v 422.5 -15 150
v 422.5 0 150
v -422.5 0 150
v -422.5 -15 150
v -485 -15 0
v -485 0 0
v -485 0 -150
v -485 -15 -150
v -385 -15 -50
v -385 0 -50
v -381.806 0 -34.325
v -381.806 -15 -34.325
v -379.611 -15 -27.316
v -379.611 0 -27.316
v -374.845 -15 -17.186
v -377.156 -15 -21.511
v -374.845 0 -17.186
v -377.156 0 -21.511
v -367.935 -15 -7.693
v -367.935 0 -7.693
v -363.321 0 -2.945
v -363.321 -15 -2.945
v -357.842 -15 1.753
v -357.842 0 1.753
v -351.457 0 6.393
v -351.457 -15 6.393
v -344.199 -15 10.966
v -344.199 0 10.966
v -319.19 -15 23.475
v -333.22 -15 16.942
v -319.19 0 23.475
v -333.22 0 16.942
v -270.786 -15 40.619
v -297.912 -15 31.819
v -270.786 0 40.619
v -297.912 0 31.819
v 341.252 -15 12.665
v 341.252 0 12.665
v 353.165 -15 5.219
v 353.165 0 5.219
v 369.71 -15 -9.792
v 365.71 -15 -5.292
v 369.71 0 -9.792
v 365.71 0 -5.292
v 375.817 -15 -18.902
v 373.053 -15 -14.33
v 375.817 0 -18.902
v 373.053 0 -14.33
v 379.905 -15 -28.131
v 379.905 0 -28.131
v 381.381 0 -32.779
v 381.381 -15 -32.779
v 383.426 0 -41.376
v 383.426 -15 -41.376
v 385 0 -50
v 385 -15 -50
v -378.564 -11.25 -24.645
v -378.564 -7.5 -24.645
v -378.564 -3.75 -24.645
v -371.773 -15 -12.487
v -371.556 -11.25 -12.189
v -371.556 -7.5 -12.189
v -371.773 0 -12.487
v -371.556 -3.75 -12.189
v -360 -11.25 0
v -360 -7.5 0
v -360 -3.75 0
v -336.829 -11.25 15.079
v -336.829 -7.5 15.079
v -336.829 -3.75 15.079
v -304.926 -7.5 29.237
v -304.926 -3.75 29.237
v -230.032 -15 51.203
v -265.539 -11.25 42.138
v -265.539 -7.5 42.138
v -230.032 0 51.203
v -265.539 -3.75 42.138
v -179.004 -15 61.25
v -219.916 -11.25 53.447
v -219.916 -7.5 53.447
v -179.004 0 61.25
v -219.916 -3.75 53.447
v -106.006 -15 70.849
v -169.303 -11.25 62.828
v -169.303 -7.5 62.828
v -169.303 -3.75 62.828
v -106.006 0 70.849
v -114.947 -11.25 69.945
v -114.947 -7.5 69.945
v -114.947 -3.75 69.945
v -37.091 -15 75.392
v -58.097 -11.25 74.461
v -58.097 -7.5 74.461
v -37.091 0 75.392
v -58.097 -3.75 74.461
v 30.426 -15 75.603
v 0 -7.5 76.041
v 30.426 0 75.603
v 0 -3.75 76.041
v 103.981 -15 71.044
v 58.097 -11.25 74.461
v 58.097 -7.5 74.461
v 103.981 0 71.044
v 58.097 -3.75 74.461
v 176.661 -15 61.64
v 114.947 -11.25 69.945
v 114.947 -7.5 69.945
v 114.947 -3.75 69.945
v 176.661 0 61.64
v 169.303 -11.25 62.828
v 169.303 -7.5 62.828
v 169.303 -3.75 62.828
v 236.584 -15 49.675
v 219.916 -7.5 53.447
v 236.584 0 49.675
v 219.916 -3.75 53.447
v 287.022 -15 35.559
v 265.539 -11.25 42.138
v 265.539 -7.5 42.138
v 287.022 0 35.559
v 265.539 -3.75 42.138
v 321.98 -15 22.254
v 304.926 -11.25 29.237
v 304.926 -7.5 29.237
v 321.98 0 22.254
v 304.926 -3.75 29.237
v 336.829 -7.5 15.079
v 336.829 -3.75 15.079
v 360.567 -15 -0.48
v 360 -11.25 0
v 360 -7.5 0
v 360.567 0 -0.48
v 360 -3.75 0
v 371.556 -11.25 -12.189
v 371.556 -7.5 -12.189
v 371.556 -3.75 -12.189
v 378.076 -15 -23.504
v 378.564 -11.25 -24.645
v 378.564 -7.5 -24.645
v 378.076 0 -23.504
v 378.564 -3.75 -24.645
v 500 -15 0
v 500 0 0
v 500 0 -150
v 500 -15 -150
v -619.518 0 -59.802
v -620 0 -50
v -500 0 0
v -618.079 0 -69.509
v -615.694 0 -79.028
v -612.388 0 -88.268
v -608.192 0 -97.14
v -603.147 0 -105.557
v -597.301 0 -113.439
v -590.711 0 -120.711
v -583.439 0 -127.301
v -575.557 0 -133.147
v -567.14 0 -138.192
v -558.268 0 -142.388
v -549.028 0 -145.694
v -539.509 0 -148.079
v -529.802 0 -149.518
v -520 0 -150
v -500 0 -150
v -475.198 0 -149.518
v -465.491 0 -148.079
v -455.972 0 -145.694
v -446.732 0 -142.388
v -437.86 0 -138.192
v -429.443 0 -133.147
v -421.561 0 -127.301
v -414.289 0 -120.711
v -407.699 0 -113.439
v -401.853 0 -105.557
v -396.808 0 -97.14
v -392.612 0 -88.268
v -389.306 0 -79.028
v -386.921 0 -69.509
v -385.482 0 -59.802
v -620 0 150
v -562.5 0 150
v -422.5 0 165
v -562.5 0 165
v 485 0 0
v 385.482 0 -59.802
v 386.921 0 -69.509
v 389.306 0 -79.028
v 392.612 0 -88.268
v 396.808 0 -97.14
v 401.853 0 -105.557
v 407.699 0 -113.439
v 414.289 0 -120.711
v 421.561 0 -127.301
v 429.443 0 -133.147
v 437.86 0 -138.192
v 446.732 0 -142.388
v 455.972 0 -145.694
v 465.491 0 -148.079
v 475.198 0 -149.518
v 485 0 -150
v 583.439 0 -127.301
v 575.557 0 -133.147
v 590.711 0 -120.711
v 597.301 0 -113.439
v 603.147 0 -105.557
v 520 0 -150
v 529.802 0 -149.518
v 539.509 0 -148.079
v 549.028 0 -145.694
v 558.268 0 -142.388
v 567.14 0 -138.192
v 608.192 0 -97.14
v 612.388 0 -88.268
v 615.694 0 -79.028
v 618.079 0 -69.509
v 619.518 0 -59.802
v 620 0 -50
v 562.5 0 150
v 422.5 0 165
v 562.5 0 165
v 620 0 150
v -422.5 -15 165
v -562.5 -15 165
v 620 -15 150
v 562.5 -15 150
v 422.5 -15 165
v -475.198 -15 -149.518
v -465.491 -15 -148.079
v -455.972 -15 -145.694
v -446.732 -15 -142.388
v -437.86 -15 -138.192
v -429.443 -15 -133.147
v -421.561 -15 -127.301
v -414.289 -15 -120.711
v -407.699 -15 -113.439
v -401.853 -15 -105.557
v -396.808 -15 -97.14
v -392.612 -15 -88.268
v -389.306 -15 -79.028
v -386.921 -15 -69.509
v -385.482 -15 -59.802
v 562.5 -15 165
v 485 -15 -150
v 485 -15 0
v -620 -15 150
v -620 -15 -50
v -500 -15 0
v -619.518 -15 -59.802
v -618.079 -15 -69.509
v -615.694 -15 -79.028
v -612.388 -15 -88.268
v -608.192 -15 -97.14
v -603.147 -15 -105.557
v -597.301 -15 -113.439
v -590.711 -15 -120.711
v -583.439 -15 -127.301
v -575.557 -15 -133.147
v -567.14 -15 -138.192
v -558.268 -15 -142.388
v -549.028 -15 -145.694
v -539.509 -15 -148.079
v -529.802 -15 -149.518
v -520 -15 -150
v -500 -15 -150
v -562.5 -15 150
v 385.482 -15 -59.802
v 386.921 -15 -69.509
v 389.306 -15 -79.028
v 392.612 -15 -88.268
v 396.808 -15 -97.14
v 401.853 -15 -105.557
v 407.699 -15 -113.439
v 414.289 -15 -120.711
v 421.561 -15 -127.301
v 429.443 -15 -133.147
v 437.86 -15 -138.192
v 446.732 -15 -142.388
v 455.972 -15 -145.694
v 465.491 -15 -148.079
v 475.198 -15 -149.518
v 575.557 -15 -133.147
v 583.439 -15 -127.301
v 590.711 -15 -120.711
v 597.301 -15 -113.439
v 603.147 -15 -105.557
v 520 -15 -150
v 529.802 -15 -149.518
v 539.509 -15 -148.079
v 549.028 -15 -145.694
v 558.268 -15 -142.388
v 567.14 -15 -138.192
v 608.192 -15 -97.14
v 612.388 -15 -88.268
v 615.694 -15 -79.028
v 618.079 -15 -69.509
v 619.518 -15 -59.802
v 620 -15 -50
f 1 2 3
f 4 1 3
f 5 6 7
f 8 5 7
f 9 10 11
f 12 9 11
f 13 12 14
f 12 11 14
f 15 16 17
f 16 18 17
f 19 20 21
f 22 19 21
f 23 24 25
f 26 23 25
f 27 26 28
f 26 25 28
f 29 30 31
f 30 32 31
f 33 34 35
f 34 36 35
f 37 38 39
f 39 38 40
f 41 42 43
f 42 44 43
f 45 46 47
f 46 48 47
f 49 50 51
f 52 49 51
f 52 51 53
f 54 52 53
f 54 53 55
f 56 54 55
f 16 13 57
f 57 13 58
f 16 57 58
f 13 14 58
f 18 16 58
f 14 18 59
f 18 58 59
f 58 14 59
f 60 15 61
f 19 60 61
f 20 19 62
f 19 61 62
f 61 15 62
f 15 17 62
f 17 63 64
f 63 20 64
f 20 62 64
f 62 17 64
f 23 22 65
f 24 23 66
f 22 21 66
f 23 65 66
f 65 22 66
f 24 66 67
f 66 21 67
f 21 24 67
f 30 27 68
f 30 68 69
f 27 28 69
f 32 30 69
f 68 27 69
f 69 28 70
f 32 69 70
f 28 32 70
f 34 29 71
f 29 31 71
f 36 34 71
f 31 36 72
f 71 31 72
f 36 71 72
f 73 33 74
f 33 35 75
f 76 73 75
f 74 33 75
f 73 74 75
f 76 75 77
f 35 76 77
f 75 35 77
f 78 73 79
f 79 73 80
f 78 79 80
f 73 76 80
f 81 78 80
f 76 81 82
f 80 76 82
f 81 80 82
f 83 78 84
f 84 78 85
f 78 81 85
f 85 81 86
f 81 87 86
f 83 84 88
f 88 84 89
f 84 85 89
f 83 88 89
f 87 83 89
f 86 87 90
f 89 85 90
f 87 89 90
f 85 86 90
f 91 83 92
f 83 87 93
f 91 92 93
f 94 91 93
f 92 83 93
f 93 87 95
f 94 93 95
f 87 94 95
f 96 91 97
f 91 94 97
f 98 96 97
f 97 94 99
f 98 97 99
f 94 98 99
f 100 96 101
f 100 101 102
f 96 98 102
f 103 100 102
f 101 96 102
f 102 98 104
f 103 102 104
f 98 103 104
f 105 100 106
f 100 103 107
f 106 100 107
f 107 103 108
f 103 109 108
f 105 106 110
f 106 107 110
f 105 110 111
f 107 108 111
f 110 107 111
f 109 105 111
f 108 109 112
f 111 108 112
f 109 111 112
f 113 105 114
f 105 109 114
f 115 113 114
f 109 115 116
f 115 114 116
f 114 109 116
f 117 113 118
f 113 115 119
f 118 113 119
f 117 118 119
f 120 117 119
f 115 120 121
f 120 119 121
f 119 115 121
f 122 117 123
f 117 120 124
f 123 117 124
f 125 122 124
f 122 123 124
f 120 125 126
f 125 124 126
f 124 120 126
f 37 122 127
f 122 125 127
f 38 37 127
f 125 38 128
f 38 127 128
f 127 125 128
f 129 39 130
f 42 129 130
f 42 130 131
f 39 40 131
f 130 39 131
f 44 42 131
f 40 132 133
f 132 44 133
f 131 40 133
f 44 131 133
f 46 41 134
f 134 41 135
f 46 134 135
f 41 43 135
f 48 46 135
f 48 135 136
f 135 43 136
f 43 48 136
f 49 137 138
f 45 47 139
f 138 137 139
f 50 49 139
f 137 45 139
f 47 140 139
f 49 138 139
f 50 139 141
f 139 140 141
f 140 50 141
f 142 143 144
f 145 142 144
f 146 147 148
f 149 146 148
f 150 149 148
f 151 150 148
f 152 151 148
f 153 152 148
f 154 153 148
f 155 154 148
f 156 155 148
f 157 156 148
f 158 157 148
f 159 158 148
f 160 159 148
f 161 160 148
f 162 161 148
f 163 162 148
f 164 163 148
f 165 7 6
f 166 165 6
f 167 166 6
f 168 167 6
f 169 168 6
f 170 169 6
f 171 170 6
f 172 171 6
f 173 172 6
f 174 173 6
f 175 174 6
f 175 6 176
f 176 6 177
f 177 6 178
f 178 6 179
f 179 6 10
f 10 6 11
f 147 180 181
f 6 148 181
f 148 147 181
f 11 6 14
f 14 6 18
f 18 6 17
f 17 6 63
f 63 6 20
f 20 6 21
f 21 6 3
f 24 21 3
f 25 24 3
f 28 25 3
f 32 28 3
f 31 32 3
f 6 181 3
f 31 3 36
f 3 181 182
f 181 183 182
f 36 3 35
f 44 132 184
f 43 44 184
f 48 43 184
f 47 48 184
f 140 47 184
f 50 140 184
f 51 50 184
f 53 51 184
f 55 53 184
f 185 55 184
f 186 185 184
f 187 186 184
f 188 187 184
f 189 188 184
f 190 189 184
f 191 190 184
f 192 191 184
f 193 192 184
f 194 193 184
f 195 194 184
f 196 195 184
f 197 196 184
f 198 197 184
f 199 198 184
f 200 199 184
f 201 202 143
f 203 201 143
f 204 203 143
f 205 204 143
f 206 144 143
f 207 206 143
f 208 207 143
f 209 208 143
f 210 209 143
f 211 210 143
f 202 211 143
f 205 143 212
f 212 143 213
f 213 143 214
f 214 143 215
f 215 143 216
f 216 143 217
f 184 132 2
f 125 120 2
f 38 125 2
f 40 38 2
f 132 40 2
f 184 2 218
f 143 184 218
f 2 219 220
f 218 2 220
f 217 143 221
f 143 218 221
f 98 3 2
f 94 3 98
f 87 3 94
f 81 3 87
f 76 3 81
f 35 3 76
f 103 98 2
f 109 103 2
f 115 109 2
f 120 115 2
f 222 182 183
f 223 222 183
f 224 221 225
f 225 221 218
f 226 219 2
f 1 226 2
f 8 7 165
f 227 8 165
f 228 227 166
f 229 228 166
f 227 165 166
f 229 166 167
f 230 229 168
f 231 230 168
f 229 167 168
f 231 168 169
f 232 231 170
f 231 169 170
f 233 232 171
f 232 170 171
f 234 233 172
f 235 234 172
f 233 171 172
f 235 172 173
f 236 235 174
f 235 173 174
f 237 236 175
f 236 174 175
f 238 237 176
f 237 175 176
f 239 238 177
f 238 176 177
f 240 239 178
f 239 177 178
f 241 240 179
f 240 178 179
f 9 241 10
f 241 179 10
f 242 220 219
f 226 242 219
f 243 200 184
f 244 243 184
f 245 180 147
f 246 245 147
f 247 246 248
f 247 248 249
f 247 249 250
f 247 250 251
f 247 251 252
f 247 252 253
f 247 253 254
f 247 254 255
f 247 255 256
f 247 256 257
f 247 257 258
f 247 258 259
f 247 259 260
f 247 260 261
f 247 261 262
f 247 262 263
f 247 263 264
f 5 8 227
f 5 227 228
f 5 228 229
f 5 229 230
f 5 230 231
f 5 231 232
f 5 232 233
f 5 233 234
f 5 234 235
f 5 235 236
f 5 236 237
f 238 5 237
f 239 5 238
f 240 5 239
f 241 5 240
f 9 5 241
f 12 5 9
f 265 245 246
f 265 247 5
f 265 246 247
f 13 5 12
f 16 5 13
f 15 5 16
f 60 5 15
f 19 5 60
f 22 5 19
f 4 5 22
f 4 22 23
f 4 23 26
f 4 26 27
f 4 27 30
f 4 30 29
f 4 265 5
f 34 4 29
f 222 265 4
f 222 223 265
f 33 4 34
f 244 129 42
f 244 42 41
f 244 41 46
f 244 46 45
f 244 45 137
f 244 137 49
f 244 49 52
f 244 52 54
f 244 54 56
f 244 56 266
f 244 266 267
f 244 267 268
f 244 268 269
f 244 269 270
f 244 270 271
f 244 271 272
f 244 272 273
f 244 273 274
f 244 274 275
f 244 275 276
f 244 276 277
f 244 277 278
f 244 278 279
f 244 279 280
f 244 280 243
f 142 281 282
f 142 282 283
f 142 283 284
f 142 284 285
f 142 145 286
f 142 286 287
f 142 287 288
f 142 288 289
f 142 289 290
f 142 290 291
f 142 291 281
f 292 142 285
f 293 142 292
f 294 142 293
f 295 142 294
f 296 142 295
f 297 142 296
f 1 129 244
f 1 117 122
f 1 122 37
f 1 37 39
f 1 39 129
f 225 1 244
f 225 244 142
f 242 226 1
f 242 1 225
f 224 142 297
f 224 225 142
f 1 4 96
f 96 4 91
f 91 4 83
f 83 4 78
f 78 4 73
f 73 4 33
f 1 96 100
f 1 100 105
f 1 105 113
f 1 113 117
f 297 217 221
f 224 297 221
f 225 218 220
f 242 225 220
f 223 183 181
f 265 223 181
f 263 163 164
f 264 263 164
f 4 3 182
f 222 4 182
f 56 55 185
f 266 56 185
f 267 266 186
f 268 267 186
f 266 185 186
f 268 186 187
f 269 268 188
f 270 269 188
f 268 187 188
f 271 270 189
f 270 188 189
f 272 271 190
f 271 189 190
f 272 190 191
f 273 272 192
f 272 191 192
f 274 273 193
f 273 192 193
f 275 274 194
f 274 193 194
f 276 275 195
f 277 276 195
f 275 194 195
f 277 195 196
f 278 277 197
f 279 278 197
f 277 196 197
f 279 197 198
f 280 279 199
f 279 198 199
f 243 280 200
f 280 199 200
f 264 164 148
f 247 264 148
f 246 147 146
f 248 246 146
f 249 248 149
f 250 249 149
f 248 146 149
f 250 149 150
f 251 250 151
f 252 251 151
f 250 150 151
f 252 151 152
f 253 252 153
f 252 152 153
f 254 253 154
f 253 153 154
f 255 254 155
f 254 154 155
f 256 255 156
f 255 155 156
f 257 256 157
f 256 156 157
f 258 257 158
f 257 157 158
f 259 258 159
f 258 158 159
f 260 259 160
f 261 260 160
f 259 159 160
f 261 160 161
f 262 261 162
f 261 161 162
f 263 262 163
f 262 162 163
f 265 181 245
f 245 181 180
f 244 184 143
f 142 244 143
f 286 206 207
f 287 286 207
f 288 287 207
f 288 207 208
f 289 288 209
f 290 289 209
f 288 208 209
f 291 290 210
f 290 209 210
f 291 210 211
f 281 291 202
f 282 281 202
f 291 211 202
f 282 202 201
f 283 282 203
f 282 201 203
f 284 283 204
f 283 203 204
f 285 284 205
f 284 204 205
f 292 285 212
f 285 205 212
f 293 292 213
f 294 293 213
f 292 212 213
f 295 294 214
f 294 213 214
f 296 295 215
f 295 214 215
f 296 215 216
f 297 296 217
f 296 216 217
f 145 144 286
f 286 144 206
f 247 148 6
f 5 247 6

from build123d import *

# Parameters (mm, degrees)
F1_DEPTH = 15


with BuildPart() as f1:
    # F0 (on Front) → F1 (new body)
    with BuildSketch(Plane.XZ):
        with BuildLine():
            Line((-562.4999962747, 150), (-619.9999962747, 150))
            Line((-619.9999962747, 150), (-619.9999962747, -50))
            ThreePointArc((-619.9999962747, -50), (-590.7106743934, -120.7106781187), (-519.9999962747, -150))
            Line((-519.9999962747, -150), (-499.9999962747, -150))
            Line((-499.9999962747, -150), (-499.9999962747, 0))
            Line((-499.9999962747, 0), (-484.9999962747, 0))
            Line((-484.9999962747, 0), (-484.9999962747, -150))
            ThreePointArc((-484.9999962747, -150), (-414.2893181561, -120.7106781187), (-384.9999962747, -50))
            add(Edge.make_bspline(
                [(-384.9999962747, -50), (-382.0572340786, -33.017525677), (-371.5647129158, 27.5340783447), (-1.601e-07, 110.9436321668), (371.5647207222, 27.5340787999), (382.0572416235, -33.0175256718), (385.0000037253, -50)],
                knots=[0, 0, 0, 0, 0.1402314153, 0.4999999982, 0.8597685847, 1, 1, 1, 1], degree=3))
            ThreePointArc((385.0000037253, -50), (414.2893256066, -120.7106781187), (485.0000037253, -150))
            Line((485.0000037253, -150), (485.0000037253, 0))
            Line((485.0000037253, 0), (500.0000037253, 0))
            Line((500.0000037253, 0), (500.0000037253, -150))
            Line((500.0000037253, -150), (520.0000037253, -150))
            ThreePointArc((520.0000037253, -150), (590.7106818439, -120.7106781187), (620.0000037253, -50))
            Line((620.0000037253, -50), (620.0000037253, 150))
            Line((620.0000037253, 150), (562.5000037253, 150))
            Line((562.5000037253, 150), (562.5000037253, 165))
            Line((562.5000037253, 165), (422.5000037253, 165))
            Line((422.5000037253, 165), (422.5000037253, 150))
            Line((422.5000037253, 150), (-422.4999962747, 150))
            Line((-422.4999962747, 150), (-422.4999962747, 165))
            Line((-422.4999962747, 165), (-562.4999962747, 165))
            Line((-562.4999962747, 165), (-562.4999962747, 150))
        make_face()
    extrude(amount=F1_DEPTH)


solid = f1.part
